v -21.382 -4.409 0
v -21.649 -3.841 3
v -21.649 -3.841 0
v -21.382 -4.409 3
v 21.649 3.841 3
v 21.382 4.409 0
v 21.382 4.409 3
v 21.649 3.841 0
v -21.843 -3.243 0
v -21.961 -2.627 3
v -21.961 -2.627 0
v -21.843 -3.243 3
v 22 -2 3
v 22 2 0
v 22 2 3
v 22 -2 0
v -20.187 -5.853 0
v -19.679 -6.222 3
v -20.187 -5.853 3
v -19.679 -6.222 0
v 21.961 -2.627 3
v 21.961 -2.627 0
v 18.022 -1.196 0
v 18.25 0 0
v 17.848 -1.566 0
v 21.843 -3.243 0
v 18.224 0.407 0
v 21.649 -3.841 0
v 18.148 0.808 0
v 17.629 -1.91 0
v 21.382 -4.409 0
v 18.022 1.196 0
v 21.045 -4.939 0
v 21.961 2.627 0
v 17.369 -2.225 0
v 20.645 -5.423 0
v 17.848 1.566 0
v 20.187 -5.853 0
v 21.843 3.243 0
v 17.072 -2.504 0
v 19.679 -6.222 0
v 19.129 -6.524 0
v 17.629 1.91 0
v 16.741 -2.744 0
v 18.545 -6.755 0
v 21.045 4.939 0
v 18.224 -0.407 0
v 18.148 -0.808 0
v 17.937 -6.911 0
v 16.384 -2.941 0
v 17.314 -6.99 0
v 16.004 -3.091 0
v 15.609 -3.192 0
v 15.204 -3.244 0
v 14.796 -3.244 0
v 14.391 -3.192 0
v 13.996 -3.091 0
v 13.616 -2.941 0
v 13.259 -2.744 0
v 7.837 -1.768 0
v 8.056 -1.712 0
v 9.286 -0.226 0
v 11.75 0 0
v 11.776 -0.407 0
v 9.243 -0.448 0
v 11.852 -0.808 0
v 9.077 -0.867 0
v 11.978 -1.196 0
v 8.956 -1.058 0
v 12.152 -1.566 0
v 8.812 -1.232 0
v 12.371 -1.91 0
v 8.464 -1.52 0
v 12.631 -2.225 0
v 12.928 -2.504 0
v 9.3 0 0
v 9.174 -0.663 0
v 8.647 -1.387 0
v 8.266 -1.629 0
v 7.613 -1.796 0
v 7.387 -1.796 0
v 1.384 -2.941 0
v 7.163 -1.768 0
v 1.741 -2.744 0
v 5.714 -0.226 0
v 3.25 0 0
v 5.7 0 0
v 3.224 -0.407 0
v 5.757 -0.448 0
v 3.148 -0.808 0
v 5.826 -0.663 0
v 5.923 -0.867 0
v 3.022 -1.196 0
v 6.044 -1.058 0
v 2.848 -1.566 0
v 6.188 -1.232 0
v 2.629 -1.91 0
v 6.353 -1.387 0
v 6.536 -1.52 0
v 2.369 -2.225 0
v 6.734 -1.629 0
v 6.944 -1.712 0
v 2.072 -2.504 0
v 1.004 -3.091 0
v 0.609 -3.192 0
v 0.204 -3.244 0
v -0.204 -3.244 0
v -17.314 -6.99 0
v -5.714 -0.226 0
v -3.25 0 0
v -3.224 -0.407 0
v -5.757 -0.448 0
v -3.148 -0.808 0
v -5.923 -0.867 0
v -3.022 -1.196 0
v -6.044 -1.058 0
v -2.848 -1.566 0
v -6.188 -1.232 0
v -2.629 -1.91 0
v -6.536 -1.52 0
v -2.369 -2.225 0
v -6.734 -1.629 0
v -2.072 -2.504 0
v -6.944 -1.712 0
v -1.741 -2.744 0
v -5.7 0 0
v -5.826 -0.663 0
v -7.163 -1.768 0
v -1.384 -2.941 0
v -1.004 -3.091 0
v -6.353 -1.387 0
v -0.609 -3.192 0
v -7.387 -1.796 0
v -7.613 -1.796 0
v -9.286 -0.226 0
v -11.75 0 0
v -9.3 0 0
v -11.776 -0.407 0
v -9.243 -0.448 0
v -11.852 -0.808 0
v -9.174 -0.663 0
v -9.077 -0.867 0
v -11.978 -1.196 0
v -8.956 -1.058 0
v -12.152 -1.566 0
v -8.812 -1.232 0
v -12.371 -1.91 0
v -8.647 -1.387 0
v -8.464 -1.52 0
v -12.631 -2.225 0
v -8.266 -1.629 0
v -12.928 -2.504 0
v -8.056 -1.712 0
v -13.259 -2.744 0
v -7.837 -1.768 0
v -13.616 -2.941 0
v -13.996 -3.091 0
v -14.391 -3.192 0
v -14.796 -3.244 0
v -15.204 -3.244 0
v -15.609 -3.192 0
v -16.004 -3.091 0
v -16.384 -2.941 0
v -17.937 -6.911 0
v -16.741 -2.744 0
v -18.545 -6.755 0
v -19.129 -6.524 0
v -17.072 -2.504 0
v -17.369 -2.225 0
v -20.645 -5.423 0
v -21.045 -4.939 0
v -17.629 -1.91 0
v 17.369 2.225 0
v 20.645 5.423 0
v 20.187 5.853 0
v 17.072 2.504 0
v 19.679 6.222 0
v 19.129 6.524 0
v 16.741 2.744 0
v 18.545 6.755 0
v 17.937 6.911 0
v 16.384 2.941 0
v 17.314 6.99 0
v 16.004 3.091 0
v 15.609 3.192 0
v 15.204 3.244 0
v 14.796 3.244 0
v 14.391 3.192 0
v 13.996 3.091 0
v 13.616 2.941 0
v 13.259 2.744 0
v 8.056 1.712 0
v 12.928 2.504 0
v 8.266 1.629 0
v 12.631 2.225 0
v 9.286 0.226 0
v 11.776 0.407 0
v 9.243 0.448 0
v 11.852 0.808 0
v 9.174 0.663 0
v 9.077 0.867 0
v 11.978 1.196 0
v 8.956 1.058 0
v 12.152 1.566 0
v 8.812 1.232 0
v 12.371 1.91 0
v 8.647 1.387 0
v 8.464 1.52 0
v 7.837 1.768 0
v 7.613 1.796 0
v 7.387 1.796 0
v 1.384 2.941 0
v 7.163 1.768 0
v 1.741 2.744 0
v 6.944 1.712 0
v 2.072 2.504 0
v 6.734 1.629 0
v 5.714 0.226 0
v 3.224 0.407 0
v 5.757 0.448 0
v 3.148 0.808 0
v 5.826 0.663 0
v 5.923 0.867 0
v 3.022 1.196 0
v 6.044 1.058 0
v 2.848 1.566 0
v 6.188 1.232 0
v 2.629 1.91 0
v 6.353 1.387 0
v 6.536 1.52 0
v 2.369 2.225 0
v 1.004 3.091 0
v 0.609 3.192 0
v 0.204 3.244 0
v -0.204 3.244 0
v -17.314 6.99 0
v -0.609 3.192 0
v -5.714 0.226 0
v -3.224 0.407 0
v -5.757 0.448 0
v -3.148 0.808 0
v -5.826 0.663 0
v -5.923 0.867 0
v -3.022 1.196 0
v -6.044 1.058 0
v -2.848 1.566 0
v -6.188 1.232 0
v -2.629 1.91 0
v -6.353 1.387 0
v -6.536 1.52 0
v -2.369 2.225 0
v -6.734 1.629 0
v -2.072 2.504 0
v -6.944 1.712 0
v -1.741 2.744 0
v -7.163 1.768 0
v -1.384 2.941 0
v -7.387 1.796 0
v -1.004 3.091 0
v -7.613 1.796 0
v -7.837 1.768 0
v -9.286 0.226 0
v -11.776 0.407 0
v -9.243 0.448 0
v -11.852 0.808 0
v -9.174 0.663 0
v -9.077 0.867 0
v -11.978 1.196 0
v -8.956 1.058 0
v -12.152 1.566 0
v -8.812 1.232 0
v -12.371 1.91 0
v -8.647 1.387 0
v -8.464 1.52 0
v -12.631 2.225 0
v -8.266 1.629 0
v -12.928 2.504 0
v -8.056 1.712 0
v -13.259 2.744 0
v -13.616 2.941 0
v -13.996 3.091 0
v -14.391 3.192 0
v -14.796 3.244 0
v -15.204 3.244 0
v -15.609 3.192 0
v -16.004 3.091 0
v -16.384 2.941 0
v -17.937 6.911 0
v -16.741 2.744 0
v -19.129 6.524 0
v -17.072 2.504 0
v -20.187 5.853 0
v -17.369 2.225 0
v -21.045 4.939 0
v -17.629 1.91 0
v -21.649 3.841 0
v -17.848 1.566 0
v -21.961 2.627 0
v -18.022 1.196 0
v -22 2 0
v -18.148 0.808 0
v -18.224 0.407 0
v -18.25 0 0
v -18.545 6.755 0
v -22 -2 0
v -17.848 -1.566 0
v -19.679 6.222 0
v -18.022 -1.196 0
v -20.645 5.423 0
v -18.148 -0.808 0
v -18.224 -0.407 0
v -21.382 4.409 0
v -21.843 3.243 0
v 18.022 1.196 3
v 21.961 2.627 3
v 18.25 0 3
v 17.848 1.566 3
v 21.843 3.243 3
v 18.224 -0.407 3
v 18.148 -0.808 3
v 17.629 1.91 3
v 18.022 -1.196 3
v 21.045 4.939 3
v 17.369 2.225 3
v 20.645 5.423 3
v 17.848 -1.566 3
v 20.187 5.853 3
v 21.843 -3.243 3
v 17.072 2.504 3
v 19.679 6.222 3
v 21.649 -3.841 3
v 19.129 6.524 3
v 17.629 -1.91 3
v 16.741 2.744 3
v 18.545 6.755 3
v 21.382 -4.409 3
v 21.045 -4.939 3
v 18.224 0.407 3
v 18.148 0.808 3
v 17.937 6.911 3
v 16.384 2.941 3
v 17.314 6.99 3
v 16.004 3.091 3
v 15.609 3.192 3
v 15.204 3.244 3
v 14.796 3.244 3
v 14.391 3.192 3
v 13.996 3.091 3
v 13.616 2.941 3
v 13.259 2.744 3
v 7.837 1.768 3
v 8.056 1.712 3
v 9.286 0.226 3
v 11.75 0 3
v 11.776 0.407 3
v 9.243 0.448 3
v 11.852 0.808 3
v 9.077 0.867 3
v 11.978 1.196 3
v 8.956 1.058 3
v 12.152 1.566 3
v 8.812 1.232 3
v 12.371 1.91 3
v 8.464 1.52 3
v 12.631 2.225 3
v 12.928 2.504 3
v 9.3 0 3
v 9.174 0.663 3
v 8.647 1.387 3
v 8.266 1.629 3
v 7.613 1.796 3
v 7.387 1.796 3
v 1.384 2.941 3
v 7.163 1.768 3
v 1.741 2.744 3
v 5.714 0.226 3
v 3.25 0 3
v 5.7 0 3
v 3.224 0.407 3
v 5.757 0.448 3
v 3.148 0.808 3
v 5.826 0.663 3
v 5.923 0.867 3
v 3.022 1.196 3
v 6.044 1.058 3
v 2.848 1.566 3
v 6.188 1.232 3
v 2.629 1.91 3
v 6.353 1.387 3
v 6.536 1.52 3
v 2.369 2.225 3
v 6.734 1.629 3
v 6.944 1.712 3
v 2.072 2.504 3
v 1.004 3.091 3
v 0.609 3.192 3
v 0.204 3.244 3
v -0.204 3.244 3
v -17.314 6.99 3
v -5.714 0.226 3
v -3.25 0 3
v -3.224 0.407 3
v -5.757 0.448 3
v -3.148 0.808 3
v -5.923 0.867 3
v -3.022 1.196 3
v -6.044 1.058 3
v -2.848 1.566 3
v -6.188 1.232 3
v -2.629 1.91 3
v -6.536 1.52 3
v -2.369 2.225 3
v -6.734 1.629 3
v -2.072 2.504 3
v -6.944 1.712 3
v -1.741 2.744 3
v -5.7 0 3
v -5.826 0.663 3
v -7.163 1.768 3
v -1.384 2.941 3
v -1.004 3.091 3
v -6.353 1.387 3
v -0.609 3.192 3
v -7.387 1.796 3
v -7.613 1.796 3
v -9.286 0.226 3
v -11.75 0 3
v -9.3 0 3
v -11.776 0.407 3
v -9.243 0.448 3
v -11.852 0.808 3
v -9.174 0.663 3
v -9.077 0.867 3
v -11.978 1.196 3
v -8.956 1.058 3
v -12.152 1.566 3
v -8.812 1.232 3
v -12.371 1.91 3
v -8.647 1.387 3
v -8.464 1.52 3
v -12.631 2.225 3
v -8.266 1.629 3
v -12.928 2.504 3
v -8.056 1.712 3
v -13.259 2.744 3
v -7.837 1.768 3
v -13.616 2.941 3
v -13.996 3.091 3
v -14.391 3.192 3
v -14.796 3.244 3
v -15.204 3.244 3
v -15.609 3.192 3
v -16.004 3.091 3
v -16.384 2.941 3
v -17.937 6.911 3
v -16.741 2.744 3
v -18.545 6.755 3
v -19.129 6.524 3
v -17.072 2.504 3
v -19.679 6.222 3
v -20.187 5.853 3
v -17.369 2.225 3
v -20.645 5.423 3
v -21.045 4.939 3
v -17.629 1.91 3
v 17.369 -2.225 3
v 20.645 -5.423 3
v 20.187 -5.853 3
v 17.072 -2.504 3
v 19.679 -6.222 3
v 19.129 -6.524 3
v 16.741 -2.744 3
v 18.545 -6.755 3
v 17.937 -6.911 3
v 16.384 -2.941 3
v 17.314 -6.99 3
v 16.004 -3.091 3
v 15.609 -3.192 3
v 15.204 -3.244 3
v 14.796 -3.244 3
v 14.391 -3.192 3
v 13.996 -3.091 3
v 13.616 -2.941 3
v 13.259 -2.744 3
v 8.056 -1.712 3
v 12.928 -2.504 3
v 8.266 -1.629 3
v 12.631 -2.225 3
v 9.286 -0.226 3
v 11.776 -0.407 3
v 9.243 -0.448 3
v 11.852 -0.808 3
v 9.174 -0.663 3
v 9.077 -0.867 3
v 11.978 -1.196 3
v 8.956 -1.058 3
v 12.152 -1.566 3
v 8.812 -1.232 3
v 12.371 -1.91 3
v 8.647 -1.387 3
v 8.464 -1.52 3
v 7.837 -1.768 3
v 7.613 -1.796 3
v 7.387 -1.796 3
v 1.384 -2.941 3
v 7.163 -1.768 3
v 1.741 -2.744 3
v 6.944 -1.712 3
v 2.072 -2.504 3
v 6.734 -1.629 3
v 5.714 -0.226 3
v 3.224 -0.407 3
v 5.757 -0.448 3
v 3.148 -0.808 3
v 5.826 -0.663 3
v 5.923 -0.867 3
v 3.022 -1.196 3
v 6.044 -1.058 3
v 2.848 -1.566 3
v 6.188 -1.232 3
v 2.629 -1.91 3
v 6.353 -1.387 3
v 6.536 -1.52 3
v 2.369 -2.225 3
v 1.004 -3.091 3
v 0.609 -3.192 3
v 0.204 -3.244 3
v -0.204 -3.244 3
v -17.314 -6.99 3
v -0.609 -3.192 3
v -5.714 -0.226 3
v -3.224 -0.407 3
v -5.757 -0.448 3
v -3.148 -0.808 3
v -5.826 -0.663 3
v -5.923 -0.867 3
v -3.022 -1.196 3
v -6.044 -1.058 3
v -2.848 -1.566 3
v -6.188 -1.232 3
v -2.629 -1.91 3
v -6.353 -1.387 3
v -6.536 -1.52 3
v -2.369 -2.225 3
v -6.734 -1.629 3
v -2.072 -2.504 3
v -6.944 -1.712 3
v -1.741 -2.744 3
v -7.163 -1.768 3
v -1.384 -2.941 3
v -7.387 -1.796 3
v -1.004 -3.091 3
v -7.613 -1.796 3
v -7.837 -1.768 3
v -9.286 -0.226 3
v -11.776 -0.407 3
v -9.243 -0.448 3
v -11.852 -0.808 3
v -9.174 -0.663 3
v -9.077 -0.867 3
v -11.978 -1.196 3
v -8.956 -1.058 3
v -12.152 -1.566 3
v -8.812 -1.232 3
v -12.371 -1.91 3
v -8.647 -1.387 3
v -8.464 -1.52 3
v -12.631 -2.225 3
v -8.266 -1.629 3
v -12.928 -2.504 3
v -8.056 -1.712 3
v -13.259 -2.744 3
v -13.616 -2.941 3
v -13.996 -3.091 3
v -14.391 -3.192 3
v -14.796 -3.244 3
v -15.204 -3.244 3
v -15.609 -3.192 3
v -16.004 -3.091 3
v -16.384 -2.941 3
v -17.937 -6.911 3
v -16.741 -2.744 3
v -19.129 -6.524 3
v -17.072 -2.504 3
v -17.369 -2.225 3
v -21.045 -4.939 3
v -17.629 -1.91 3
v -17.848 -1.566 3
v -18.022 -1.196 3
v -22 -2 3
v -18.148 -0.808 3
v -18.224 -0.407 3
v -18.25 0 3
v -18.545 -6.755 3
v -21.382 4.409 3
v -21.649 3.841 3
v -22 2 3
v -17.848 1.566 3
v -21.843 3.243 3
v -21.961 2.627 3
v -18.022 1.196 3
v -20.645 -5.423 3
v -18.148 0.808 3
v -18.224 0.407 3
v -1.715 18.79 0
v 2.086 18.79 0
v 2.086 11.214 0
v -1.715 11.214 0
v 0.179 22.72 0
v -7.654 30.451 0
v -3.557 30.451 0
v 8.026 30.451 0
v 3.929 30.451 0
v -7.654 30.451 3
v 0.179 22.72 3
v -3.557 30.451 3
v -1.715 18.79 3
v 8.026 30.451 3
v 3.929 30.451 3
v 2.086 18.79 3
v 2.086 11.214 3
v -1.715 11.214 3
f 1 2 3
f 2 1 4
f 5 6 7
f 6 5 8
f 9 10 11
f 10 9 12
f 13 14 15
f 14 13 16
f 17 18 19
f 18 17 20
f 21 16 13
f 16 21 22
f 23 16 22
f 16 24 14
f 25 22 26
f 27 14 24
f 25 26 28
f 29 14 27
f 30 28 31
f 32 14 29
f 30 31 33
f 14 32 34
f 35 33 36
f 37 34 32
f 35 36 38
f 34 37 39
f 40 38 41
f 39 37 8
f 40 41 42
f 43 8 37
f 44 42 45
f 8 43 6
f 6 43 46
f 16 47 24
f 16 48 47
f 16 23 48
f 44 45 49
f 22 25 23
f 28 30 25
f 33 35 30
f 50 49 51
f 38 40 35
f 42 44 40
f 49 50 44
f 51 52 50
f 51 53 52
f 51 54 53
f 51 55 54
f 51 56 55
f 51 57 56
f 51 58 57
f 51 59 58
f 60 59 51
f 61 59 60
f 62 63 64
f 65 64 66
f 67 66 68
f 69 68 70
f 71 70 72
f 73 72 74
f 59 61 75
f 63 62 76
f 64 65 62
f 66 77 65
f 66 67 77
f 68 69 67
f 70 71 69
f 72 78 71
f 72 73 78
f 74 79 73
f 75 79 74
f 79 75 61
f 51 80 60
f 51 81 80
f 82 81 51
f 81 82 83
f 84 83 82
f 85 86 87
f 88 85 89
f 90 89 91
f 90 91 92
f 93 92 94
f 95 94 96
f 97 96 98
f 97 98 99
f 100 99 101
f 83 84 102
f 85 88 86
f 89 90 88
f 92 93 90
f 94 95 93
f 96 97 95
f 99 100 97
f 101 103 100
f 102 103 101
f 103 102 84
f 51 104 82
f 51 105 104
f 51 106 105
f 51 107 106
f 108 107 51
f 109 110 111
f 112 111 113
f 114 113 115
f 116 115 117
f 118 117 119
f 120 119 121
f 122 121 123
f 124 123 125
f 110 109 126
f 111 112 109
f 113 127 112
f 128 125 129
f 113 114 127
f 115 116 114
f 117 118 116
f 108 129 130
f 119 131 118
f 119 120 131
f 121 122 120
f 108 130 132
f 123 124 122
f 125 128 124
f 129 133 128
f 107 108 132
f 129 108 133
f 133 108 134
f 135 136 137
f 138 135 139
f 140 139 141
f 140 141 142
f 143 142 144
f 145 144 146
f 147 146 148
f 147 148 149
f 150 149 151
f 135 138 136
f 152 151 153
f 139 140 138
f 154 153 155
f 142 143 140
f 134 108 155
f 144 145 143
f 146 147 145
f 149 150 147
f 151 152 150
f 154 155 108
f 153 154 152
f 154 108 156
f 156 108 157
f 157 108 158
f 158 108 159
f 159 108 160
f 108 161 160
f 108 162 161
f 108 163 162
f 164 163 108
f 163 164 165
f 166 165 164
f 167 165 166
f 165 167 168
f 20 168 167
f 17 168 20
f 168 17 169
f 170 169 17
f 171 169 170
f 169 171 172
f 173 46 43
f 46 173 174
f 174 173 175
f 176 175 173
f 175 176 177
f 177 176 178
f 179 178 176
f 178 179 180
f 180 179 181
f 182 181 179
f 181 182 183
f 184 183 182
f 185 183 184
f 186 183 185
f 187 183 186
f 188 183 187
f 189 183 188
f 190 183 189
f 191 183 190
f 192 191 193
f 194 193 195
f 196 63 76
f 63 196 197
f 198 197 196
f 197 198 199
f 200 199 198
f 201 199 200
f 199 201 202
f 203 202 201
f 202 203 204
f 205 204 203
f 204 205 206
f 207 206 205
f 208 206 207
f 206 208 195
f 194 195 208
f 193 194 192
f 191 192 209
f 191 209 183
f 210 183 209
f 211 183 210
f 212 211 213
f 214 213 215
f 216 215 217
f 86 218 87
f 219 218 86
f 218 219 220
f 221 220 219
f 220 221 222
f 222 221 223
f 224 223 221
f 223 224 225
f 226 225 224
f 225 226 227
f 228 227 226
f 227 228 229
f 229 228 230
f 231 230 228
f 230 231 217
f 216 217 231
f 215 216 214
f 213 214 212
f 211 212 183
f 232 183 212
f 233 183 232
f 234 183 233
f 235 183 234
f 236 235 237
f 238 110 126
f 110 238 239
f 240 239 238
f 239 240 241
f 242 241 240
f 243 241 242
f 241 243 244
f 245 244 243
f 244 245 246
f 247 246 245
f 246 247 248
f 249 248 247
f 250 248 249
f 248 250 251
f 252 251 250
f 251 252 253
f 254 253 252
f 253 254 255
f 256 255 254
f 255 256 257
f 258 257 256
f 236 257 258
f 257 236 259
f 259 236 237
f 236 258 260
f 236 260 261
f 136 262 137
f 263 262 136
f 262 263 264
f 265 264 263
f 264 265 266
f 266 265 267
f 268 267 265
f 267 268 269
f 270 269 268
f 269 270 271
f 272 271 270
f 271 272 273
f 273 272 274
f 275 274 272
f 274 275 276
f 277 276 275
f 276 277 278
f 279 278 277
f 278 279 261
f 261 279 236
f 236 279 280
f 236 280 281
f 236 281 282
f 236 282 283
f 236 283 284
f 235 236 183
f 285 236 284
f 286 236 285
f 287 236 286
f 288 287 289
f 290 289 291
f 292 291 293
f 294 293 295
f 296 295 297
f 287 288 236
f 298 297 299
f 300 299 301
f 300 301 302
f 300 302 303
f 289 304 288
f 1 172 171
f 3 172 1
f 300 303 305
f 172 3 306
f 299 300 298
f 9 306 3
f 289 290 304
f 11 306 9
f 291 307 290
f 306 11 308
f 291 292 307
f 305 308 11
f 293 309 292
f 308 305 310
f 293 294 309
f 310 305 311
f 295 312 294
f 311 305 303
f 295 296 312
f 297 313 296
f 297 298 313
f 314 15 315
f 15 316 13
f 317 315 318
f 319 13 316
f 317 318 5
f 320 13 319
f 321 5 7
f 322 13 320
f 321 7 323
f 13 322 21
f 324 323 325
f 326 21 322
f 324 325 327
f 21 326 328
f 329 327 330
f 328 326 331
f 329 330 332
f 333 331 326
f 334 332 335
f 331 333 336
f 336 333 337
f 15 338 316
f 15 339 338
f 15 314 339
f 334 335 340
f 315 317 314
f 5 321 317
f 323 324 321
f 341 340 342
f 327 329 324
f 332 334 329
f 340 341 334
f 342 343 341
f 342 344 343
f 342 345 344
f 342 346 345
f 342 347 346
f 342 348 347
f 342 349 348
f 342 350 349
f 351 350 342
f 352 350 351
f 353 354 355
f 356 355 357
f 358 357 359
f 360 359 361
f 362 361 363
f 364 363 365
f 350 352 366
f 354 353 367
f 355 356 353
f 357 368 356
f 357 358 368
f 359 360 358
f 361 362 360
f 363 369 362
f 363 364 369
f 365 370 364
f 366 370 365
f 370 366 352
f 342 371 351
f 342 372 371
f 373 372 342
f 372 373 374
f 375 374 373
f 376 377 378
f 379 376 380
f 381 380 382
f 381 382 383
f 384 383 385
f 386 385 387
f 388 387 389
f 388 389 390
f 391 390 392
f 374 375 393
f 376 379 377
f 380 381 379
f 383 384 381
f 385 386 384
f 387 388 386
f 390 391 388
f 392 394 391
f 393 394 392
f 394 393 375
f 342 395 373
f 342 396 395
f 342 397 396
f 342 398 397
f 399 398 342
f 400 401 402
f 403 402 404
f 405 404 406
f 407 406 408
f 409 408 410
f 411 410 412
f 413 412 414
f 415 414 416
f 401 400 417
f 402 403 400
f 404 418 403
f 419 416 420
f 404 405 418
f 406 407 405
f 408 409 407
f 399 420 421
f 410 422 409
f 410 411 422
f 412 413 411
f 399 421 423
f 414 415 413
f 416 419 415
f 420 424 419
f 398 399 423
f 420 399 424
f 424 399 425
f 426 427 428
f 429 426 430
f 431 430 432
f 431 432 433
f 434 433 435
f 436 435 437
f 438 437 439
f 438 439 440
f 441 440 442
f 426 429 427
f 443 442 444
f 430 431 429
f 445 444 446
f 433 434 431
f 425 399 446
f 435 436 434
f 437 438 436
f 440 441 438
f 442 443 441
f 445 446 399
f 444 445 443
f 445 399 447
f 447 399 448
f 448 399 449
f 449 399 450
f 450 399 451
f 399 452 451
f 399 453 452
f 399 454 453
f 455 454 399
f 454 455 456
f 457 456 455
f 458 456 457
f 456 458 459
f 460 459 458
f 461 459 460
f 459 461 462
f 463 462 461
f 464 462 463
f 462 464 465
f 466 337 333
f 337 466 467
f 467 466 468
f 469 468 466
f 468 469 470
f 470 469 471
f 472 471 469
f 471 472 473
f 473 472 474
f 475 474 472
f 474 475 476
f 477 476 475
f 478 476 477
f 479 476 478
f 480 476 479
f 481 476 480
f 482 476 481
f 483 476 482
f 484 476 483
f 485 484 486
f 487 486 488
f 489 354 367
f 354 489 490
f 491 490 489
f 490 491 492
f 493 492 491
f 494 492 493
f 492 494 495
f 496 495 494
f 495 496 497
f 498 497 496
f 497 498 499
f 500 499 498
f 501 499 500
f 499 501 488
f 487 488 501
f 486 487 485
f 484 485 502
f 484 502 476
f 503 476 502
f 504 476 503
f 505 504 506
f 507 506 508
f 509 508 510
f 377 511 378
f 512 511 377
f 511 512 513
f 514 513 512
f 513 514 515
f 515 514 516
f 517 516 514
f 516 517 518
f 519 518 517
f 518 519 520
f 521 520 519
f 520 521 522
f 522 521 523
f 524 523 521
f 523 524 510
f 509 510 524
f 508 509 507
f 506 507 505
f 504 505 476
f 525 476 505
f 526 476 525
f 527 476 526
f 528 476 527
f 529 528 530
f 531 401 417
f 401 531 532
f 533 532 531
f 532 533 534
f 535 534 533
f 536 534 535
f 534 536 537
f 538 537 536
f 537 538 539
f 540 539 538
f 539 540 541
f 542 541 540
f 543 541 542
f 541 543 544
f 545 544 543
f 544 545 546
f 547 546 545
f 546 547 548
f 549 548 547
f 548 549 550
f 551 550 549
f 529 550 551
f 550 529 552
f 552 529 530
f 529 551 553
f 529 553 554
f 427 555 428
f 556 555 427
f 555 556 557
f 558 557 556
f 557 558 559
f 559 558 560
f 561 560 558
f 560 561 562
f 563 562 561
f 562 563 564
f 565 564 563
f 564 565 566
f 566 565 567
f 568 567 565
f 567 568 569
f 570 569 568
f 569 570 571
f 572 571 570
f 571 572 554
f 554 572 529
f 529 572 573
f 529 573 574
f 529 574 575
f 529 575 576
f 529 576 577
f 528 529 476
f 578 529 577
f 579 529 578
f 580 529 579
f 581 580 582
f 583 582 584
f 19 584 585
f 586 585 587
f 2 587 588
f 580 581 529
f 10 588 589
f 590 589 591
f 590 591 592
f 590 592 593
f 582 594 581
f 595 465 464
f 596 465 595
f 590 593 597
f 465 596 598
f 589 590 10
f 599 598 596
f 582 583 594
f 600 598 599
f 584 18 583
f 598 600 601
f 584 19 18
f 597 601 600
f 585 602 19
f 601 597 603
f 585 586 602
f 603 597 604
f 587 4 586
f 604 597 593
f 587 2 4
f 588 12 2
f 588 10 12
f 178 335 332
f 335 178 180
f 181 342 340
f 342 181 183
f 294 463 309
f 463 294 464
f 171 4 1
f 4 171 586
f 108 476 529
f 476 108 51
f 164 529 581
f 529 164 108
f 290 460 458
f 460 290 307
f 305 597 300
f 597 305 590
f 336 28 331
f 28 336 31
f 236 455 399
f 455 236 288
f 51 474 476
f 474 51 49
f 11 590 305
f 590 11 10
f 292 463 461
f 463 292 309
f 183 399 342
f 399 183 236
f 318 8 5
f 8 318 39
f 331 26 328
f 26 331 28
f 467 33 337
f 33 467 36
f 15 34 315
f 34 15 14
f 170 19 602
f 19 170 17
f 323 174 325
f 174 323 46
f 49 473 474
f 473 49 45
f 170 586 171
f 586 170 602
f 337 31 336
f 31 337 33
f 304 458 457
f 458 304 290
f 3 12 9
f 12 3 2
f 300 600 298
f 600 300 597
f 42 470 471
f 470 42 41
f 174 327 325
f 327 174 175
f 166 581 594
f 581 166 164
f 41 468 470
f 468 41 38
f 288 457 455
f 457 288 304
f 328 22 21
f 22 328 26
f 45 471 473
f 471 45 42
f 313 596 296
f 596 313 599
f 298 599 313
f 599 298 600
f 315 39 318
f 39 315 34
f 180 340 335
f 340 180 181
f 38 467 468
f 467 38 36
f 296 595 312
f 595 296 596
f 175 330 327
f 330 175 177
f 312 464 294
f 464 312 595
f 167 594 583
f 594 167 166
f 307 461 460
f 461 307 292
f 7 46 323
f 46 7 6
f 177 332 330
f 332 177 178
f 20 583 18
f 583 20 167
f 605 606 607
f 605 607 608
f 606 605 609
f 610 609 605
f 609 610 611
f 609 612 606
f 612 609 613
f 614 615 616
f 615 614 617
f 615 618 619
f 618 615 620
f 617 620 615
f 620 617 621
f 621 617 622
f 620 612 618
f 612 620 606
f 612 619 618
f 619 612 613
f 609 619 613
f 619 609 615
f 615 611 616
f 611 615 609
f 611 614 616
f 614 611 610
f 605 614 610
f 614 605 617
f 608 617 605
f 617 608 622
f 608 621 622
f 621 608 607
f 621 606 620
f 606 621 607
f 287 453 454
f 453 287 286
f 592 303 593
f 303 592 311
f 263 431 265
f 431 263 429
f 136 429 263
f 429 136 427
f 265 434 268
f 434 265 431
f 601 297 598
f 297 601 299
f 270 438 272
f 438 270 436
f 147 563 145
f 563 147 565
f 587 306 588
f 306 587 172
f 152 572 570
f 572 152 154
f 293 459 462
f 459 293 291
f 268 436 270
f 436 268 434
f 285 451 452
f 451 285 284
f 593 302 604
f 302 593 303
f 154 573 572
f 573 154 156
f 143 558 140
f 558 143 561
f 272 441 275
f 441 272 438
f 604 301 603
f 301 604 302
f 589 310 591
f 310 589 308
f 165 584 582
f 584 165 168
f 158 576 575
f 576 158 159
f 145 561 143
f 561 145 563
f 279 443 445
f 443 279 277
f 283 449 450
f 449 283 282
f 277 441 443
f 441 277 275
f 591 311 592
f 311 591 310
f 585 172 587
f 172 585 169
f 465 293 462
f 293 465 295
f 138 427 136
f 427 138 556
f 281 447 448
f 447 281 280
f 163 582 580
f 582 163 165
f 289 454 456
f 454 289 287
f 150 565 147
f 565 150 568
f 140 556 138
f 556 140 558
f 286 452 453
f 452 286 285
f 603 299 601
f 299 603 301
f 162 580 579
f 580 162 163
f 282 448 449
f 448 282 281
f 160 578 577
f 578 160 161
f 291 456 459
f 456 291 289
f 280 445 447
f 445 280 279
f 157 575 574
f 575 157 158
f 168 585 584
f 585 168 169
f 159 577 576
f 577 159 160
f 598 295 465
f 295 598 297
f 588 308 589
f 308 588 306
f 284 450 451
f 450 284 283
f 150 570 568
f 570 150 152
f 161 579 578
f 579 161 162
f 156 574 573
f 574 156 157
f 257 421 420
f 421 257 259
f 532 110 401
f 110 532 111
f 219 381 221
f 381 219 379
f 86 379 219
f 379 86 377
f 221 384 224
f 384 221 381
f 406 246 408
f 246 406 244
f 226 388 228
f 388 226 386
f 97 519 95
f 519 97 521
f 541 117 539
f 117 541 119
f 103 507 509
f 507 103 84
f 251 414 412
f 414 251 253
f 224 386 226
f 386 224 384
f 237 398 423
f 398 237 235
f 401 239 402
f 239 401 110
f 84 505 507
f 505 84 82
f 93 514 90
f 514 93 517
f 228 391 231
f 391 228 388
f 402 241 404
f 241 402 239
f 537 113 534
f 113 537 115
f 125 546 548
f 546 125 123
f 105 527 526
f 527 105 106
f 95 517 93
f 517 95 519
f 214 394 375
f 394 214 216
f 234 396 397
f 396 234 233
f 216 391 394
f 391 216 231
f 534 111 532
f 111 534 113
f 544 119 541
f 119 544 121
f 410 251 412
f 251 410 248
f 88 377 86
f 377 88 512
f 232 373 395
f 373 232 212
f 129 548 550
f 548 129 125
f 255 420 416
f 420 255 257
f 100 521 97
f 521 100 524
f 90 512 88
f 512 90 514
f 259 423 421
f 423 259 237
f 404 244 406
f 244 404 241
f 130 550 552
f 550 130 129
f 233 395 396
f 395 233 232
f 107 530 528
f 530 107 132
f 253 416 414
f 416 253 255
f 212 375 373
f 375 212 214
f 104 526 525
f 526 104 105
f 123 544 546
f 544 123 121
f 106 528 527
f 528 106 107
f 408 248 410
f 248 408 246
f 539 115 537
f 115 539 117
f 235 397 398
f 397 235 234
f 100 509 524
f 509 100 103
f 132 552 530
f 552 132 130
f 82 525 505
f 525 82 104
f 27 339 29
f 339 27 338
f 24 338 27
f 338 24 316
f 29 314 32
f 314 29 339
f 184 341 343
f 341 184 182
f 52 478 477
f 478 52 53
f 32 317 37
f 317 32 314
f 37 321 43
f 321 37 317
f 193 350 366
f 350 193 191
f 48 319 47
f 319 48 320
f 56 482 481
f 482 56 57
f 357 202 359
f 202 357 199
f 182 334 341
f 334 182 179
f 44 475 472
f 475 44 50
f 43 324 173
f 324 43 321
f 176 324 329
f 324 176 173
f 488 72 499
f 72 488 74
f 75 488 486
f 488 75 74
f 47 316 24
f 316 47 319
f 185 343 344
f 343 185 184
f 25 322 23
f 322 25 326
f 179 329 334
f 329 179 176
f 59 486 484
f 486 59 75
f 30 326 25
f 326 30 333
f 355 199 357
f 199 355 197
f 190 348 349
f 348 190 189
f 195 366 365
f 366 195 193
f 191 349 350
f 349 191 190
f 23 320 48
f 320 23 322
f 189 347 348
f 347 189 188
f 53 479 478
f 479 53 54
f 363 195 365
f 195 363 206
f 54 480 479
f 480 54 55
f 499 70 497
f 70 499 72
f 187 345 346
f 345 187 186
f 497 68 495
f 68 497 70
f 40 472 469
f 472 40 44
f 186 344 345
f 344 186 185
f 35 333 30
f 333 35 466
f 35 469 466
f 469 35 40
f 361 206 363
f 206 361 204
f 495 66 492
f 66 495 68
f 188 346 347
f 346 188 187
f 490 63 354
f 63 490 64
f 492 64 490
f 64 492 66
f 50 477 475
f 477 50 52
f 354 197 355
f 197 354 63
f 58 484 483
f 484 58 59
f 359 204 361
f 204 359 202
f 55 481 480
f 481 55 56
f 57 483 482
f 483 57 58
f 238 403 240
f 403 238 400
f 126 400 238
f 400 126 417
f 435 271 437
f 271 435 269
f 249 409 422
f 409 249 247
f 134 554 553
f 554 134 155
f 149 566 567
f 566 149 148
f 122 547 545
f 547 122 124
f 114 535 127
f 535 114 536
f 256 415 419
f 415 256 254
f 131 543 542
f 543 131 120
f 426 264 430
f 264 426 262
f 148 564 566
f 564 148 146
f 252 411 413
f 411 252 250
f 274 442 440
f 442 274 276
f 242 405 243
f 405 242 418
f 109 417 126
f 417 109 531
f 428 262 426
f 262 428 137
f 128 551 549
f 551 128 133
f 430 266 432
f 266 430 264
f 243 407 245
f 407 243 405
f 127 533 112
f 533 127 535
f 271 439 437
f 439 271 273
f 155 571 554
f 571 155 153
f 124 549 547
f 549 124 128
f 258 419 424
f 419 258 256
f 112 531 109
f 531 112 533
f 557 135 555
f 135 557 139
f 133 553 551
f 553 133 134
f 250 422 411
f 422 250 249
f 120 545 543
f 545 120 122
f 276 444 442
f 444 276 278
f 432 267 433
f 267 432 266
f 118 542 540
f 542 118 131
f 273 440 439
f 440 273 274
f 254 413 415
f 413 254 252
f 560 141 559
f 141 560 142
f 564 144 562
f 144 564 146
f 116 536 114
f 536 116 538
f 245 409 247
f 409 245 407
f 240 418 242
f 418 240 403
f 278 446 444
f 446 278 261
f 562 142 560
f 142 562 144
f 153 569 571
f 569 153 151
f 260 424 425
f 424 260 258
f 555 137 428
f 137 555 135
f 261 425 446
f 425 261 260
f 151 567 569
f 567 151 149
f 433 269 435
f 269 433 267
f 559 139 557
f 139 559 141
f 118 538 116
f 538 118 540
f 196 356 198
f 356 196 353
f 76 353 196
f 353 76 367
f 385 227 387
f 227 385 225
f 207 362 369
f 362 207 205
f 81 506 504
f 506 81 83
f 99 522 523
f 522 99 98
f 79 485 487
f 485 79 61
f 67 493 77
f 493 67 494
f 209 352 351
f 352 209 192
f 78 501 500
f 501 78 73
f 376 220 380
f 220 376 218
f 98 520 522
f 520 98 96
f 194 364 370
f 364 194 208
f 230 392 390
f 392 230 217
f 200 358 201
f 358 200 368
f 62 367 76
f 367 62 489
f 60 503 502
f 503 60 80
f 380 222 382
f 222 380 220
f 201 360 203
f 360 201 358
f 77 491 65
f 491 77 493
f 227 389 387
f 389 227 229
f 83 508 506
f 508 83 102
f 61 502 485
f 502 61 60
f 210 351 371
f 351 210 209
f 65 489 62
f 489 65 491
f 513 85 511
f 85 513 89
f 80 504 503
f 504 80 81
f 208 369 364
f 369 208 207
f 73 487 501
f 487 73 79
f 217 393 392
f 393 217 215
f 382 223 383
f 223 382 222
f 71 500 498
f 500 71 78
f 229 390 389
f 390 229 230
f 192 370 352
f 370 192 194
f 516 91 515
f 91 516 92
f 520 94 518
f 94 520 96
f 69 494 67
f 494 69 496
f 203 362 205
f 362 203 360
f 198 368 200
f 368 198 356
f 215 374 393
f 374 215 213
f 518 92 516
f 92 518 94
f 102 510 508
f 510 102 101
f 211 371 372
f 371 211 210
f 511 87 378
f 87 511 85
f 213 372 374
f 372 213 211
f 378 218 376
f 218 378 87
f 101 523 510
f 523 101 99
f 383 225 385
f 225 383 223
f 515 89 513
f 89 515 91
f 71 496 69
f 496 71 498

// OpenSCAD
$fn = 50;


difference() {
	union() {
		hull() {
			translate(v = [-17.0000000000, 2.0000000000, 0]) {
				cylinder(h = 3, r = 5);
			}
			translate(v = [17.0000000000, 2.0000000000, 0]) {
				cylinder(h = 3, r = 5);
			}
			translate(v = [-17.0000000000, -2.0000000000, 0]) {
				cylinder(h = 3, r = 5);
			}
			translate(v = [17.0000000000, -2.0000000000, 0]) {
				cylinder(h = 3, r = 5);
			}
		}
		translate(v = [0, 30.0000000000, 0]) {
			linear_extrude(height = 3) {
				text(font = "DejaVu Sans Mono:style=Bold", halign = "center", size = 19.0000000000, text = "Y", valign = "top");
			}
		}
	}
	union() {
		translate(v = [-15.0000000000, 0.0000000000, 0]) {
			translate(v = [0, 0, -100]) {
				cylinder(h = 200, r = 3.2500000000);
			}
		}
		translate(v = [0, 0, -100]) {
			cylinder(h = 200, r = 3.2500000000);
		}
		translate(v = [15.0000000000, 0.0000000000, 0]) {
			translate(v = [0, 0, -100]) {
				cylinder(h = 200, r = 3.2500000000);
			}
		}
		translate(v = [-15.0000000000, 0.0000000000, 0]) {
			translate(v = [0, 0, -100]) {
				cylinder(h = 200, r = 1.8000000000);
			}
		}
		translate(v = [-7.5000000000, 0.0000000000, 0]) {
			translate(v = [0, 0, -100]) {
				cylinder(h = 200, r = 1.8000000000);
			}
		}
		translate(v = [0, 0, -100]) {
			cylinder(h = 200, r = 1.8000000000);
		}
		translate(v = [7.5000000000, 0.0000000000, 0]) {
			translate(v = [0, 0, -100]) {
				cylinder(h = 200, r = 1.8000000000);
			}
		}
		translate(v = [15.0000000000, 0.0000000000, 0]) {
			translate(v = [0, 0, -100]) {
				cylinder(h = 200, r = 1.8000000000);
			}
		}
	}
}
